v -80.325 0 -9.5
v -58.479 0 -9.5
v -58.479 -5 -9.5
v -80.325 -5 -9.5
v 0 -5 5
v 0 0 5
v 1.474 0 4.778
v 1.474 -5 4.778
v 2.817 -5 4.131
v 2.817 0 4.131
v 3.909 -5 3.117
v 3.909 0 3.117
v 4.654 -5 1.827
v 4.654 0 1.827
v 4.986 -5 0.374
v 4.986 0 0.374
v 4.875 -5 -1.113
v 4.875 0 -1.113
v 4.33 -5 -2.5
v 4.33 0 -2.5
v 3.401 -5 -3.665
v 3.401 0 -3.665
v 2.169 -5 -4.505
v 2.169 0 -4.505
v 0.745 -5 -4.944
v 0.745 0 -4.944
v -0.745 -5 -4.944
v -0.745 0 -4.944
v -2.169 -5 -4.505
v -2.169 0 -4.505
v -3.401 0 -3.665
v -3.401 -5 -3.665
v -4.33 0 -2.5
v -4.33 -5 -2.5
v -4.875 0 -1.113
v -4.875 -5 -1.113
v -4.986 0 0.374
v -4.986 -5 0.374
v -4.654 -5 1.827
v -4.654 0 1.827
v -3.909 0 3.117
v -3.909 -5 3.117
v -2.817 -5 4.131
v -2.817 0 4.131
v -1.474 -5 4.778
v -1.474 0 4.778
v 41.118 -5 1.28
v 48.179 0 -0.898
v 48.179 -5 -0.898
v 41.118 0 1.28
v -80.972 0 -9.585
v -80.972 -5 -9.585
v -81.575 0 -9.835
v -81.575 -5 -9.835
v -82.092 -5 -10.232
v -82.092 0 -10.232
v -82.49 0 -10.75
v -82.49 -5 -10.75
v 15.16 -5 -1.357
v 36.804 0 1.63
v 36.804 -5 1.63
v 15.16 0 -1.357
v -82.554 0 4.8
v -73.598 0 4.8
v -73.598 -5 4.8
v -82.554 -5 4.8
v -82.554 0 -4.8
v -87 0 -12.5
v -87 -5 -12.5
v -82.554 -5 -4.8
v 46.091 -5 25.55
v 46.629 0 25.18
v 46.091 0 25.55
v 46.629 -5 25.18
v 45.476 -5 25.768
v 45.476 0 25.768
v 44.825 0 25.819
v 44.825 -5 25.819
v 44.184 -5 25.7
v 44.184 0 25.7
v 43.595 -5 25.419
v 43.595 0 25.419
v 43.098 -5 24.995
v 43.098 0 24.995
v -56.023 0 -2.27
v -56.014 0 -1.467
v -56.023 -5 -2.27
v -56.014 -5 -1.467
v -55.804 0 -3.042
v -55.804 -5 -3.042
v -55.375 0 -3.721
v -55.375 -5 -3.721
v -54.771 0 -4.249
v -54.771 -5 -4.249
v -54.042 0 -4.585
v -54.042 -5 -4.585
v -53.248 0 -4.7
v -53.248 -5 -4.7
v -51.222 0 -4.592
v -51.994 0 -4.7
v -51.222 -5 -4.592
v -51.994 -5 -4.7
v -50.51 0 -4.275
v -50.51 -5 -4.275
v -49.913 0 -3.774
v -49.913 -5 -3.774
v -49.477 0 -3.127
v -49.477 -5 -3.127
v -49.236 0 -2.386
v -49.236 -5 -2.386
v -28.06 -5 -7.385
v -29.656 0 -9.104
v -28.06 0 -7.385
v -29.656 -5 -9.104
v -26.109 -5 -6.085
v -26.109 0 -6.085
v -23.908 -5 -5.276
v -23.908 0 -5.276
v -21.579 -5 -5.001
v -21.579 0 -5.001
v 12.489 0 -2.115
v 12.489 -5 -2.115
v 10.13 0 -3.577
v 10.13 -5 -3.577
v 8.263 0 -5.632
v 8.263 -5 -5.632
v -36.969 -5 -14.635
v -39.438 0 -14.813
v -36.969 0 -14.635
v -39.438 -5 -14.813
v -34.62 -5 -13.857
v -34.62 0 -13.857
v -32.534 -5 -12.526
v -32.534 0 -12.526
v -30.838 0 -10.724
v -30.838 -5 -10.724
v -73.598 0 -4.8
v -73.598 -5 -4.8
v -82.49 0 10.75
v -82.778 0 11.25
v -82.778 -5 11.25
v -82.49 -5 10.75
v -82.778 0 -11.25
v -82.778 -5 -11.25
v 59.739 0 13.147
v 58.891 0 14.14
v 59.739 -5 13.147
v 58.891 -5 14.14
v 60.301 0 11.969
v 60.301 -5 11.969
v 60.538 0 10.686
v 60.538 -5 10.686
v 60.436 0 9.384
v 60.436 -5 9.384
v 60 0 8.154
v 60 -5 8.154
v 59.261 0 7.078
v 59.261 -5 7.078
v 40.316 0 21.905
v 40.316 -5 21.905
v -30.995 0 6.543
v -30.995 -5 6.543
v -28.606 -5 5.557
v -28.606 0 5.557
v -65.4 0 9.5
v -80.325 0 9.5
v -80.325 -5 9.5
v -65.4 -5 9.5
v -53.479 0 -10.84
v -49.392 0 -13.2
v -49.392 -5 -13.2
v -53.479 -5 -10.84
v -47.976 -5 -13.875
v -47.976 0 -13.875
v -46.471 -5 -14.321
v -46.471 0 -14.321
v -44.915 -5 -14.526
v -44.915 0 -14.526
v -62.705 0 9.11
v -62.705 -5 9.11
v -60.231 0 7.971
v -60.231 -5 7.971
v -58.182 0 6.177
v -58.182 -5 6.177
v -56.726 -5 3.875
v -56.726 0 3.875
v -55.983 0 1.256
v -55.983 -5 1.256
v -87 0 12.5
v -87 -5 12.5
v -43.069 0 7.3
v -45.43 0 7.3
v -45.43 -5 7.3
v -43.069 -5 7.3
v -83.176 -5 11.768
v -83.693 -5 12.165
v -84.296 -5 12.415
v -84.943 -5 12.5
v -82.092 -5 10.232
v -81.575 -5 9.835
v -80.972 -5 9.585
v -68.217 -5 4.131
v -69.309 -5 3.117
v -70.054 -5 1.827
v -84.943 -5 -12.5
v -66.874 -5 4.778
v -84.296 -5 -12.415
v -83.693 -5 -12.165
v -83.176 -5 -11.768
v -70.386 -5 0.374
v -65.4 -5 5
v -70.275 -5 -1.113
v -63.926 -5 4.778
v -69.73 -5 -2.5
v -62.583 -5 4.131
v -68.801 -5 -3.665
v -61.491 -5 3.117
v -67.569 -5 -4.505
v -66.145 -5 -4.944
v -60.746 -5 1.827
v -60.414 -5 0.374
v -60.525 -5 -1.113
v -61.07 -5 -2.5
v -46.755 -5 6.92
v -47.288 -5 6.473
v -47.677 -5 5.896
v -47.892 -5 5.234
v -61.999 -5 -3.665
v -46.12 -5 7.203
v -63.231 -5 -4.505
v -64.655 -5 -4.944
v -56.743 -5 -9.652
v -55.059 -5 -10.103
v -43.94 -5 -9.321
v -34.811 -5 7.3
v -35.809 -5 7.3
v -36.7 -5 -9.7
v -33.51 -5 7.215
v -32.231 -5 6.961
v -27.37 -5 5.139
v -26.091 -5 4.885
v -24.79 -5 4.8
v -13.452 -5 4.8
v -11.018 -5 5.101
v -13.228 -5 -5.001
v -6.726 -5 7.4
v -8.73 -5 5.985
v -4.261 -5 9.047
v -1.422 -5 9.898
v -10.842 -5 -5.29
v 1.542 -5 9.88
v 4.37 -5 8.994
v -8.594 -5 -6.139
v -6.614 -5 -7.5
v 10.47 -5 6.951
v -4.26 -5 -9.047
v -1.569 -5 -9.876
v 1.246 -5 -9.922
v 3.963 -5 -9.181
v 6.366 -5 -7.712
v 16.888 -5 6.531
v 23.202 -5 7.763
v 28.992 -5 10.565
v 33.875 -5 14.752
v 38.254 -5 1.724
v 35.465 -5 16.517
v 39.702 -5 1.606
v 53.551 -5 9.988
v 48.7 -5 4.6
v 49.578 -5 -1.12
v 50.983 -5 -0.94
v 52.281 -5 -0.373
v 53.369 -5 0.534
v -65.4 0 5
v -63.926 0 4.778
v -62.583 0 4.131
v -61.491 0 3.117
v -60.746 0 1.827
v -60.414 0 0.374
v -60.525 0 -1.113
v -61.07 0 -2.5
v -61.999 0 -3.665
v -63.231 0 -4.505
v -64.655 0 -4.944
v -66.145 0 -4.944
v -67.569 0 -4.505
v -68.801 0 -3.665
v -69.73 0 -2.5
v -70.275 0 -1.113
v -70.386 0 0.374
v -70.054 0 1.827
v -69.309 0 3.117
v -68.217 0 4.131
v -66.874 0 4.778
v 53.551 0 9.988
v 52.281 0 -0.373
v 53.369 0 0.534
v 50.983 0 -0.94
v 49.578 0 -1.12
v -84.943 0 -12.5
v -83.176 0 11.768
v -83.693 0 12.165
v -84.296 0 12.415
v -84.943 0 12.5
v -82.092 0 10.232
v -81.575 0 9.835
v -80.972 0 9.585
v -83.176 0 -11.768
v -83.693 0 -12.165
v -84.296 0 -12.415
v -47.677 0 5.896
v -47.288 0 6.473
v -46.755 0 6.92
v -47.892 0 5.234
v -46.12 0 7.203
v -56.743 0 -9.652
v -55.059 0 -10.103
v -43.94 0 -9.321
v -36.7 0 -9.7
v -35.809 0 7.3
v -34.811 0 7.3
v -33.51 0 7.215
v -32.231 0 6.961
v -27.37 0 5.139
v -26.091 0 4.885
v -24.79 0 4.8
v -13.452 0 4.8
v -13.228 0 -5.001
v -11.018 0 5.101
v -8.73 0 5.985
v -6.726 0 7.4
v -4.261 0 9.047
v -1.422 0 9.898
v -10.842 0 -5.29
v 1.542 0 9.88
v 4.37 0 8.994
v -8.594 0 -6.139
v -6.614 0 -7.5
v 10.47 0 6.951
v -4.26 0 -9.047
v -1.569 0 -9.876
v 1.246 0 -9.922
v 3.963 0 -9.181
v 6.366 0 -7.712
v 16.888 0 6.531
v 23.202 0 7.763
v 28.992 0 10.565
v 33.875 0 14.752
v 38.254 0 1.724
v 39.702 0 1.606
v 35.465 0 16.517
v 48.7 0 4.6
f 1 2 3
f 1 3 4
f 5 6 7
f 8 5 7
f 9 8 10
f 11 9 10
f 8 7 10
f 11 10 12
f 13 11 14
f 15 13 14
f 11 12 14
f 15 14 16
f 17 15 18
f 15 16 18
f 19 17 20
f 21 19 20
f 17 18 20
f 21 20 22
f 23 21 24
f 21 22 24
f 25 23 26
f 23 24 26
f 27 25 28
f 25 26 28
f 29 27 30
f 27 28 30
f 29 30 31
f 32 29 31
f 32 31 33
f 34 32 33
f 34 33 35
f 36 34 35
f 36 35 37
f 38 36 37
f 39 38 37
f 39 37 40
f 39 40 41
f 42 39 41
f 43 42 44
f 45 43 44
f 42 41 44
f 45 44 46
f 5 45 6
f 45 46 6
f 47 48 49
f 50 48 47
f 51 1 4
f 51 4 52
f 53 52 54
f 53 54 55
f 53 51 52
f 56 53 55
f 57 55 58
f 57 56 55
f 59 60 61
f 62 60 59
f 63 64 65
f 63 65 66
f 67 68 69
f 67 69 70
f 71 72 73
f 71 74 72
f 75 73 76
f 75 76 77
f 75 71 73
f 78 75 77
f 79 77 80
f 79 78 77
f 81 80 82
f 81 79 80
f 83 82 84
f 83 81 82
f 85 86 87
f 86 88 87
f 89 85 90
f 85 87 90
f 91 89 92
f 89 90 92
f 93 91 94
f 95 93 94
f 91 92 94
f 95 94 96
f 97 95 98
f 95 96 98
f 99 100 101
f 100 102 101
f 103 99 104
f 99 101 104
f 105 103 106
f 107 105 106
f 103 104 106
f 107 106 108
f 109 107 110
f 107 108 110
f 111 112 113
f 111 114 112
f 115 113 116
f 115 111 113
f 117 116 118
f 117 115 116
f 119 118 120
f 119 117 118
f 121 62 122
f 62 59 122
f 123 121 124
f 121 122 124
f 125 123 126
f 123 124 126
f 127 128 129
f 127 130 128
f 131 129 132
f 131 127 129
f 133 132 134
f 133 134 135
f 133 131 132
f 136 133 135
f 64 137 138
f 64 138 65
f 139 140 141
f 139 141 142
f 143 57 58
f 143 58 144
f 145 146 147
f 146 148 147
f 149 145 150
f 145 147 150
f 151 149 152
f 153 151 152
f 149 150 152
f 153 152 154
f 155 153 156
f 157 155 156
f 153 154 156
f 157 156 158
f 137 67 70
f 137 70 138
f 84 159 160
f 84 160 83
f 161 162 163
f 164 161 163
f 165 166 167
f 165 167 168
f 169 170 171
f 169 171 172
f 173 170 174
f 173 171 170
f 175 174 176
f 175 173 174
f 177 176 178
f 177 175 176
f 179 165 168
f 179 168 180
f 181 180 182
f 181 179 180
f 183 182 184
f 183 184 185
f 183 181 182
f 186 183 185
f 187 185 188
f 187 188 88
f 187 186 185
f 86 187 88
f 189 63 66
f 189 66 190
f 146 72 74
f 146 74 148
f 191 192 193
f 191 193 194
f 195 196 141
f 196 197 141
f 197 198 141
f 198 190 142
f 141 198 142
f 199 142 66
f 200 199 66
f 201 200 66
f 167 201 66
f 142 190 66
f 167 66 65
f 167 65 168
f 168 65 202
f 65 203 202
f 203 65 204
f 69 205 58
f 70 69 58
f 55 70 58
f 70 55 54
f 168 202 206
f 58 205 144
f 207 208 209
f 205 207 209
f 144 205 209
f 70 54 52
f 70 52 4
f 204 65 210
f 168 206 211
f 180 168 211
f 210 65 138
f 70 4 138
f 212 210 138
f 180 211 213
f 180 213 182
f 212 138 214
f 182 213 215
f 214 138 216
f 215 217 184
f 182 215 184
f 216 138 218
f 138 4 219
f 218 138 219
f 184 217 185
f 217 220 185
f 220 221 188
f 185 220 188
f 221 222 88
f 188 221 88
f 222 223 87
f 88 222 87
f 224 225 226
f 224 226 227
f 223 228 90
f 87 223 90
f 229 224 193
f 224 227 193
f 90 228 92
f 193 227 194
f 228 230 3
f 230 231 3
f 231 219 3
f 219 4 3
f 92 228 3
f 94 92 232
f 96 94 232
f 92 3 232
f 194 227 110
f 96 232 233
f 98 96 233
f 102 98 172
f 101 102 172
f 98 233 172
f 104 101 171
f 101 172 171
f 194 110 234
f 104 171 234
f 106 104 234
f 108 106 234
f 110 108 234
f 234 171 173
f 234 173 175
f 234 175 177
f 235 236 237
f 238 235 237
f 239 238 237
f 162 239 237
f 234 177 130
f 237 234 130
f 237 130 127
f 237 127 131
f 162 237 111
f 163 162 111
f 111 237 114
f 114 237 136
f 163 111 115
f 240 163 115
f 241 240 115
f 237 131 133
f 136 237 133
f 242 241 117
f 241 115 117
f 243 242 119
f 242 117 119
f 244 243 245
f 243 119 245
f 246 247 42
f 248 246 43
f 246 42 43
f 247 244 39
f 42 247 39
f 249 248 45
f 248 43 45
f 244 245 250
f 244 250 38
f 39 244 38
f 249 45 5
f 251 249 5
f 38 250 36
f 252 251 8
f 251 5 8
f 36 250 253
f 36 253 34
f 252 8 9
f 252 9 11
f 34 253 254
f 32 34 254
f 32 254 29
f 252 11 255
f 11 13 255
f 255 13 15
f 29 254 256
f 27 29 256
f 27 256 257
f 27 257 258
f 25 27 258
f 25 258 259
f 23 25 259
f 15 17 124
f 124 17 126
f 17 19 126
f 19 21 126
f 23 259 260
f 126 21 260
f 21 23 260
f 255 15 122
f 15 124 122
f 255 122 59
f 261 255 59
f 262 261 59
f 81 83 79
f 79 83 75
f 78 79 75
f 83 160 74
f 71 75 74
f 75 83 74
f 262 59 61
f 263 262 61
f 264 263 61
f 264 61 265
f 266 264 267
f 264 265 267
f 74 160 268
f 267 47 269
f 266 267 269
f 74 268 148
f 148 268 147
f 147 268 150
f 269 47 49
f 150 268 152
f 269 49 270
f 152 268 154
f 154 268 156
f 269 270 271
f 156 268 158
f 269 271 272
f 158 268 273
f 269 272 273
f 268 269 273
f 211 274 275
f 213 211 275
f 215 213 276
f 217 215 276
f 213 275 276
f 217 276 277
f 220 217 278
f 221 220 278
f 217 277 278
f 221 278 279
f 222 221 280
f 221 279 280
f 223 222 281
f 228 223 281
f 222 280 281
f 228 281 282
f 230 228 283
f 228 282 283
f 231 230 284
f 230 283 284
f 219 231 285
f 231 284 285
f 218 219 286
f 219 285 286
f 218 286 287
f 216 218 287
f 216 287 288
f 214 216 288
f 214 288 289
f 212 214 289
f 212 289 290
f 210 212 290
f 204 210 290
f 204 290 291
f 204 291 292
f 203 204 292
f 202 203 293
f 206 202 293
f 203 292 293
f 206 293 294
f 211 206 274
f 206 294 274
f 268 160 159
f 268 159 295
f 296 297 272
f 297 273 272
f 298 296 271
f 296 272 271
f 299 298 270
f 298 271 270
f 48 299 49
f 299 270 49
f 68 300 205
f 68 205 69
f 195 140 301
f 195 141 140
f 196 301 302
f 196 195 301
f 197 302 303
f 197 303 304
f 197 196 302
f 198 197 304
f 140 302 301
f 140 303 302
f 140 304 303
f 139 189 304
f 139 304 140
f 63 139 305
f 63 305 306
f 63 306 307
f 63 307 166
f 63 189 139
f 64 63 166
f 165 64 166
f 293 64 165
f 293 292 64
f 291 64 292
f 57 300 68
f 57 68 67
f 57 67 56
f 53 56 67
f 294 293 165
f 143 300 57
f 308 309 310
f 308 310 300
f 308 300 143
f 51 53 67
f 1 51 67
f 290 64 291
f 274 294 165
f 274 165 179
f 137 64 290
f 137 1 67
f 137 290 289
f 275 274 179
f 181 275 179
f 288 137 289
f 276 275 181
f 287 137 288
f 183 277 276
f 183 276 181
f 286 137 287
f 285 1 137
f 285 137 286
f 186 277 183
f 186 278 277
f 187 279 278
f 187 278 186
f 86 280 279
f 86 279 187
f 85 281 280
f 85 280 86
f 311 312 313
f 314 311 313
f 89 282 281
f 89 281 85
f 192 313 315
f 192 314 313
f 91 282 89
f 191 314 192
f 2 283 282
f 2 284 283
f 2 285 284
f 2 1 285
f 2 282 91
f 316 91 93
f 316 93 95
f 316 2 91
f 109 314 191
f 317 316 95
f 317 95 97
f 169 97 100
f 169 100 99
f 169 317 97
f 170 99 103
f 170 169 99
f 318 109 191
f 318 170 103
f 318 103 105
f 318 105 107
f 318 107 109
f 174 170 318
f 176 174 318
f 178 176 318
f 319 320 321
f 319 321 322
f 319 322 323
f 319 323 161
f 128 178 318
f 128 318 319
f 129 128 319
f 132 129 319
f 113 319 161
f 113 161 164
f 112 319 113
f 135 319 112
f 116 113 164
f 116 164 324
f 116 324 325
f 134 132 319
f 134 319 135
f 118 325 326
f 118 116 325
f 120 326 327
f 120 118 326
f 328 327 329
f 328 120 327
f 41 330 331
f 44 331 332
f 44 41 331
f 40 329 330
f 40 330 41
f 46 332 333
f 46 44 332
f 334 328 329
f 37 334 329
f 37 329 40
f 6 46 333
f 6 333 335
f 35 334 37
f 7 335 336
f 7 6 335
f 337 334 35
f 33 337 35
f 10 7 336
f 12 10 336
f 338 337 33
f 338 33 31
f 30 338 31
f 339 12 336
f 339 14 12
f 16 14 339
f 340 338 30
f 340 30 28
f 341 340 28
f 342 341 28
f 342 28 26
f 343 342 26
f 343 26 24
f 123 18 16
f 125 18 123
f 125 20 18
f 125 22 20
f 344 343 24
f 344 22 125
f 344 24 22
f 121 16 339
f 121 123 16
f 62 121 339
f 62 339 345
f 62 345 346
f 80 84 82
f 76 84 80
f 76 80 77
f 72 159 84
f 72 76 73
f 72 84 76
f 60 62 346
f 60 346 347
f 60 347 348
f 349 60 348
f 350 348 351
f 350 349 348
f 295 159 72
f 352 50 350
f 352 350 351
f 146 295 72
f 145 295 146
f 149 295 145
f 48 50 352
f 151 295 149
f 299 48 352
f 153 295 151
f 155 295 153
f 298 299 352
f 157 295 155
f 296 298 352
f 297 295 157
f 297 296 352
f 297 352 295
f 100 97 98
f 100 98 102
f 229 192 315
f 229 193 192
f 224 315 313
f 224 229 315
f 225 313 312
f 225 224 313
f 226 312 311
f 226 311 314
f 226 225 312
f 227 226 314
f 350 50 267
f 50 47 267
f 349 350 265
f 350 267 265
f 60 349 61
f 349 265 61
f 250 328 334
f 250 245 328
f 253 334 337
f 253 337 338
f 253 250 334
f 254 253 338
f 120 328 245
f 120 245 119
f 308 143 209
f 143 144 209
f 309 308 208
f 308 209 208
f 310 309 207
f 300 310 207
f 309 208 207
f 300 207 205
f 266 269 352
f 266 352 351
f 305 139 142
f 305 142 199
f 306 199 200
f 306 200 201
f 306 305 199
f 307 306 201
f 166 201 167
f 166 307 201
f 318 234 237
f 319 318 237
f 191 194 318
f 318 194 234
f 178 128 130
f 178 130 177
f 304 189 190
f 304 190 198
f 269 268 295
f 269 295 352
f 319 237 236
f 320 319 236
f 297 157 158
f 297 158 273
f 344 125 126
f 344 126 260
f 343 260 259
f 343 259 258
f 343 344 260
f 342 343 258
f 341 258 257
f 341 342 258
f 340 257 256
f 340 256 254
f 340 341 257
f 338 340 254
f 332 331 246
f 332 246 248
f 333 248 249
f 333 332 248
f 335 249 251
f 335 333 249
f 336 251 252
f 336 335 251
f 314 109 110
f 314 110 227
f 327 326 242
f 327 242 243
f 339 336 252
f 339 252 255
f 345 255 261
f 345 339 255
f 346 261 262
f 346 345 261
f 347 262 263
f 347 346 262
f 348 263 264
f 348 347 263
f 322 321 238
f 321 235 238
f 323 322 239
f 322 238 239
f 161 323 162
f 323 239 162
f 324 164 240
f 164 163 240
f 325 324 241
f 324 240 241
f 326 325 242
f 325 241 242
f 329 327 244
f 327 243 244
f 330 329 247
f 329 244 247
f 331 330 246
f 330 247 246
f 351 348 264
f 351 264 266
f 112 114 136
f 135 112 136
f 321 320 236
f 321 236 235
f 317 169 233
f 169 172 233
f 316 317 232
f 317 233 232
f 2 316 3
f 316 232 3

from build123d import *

# Parameters (mm, degrees)
SKETCH_2_R          = 5
EXTRUDE_1_DEPTH     = 5
CUT_EXTRUDE_1_DEPTH = 92.187134051
FILLET_1_R          = 2.8
FILLET_2_R          = 2.8
FILLET_3_R          = 10
FILLET_4_R          = 5
FILLET_5_R          = 2.5
FILLET_6_R          = 10


with BuildPart() as part:
    # 草图2 → 凸台-拉伸1 (new body)
    # profile 1 of 2: a face of its own
    with BuildSketch(Plane(origin=(0, 0, 0), x_dir=(1, 0, 0), z_dir=(0, 1, 0))):
        with BuildLine():
            Line((-55.8, 9.5), (-65.4, 9.5))
            ThreePointArc((-65.4, 9.5), (-60.625065445, 8.212794896), (-57.144093024, 4.7))
            Line((-57.144093024, 4.7), (-49.644093024, 4.7))
            Line((-49.644093024, 4.7), (-47.528169255, -7.3))
            Line((-47.528169255, -7.3), (-32.828169255, -7.3))
            Line((-32.828169255, -7.3), (-26.77268488, -4.8))
            Line((-26.77268488, -4.8), (-8.77268488, -4.8))
            ThreePointArc((-8.77268488, -4.8), (-3.040245716, -9.526641905), (4.370469962, -8.994386711))
            ThreePointArc((4.370469962, -8.994386711), (20.084939282, -6.943193169), (33.875265504, -14.75208833))
            Line((33.875265504, -14.75208833), (44.771139737, -26.853182613))
            Line((44.771139737, -26.853182613), (62.606615548, -10.794048061))
            Line((62.606615548, -10.794048061), (51.23139524, 1.839413972))
            Line((51.23139524, 1.839413972), (39, -1.933246956))
            Line((39, -1.933246956), (9.777013859, 2.1))
            ThreePointArc((9.777013859, 2.1), (1.554340892, 9.878462653), (-8.659704384, 5.000951907))
            Line((-8.659704384, 5.000951907), (-26.659704384, 5.000951907))
            Line((-26.659704384, 5.000951907), (-34.031178231, 15.096068218))
            Line((-34.031178231, 15.096068218), (-47.312951043, 14.4))
            Line((-47.312951043, 14.4), (-55.8, 9.5))
        make_face()
        with Locations(Location((0, 0, 0), (0, 0, 270))):
            Circle(SKETCH_2_R, mode=Mode.SUBTRACT)
    # profile 2 of 2: a face of its own
    with BuildSketch(Plane(origin=(0, 0, 0), x_dir=(1, 0, 0), z_dir=(0, 1, 0))):
        with BuildLine():
            Line((-80.324573519, -9.5), (-65.4, -9.5))
            ThreePointArc((-65.4, -9.5), (-55.9, 0), (-65.4, 9.5))
            Line((-65.4, 9.5), (-80.324573519, 9.5))
            ThreePointArc((-80.324573519, 9.5), (-81.574573519, 9.834936491), (-82.489637029, 10.75))
            Line((-82.489637029, 10.75), (-83.5, 12.5))
            Line((-83.5, 12.5), (-87, 12.5))
            Line((-87, 12.5), (-82.554402927, 4.8))
            Line((-82.554402927, 4.8), (-73.598170528, 4.8))
            Line((-73.598170528, 4.8), (-73.598170528, -4.8))
            Line((-73.598170528, -4.8), (-82.554402927, -4.8))
            Line((-82.554402927, -4.8), (-87, -12.5))
            Line((-87, -12.5), (-83.5, -12.5))
            Line((-83.5, -12.5), (-82.489637029, -10.75))
            ThreePointArc((-82.489637029, -10.75), (-81.574573519, -9.834936491), (-80.324573519, -9.5))
        make_face()
        with Locations(Location((-65.4, 0, 0), (0, 0, 270))):
            Circle(SKETCH_2_R, mode=Mode.SUBTRACT)
    extrude(amount=-EXTRUDE_1_DEPTH)

    # 草图4 → 切除-拉伸1 (cut, through all)
    with BuildSketch(Plane(origin=(0, -5, 0), x_dir=(-1, 0, 0), z_dir=(0, -1, 0))):
        Polygon((42.343817462, -21.137636493), (43.940064127, 9.320564317), (36.7, 9.7), (35.103753335, -20.75820081), align=None)
        Polygon((-48.7, -4.6), (-26.034082823, -25.008483494), (-30.885279719, -30.396283479), (-53.551196896, -9.987799985), align=None)
    extrude(amount=-CUT_EXTRUDE_1_DEPTH, mode=Mode.SUBTRACT)

    # 圆角1
    fillet_1_edges = [part.edges().sort_by_distance(p)[0] for p in [
        (-57.144093024, -2.5, -4.7),
    ]]
    fillet(fillet_1_edges, radius=FILLET_1_R)

    # 圆角2
    fillet_2_edges = [part.edges().sort_by_distance(p)[0] for p in [
        (-49.644093024, -2.5, -4.7),
    ]]
    fillet(fillet_2_edges, radius=FILLET_2_R)

    # 圆角3
    fillet_3_edges = [part.edges().sort_by_distance(p)[0] for p in [
        (-47.312951043, -2.5, -14.4),
        (-34.031178231, -2.5, -15.096068218),
        (-26.659704384, -2.5, -5.000951907),
        (-8.659704384, -2.5, -5.000951907),
        (9.777013859, -2.5, -2.1),
        (39, -2.5, 1.933246956),
        (-8.77268488, -2.5, 4.8),
        (-26.77268488, -2.5, 4.8),
        (-32.828169255, -2.5, 7.3),
    ]]
    fillet(fillet_3_edges, radius=FILLET_3_R)

    # 圆角4
    fillet_4_edges = [part.edges().sort_by_distance(p)[0] for p in [
        (51.23139524, -2.5, -1.839413972),
        (62.606615548, -2.5, 10.794048061),
    ]]
    fillet(fillet_4_edges, radius=FILLET_4_R)

    # 圆角5
    fillet_5_edges = [part.edges().sort_by_distance(p)[0] for p in [
        (44.771139737, -2.5, 26.853182613),
        (-47.528169255, -2.5, 7.3),
        (-83.5, -2.5, 12.5),
        (-83.5, -2.5, -12.5),
    ]]
    fillet(fillet_5_edges, radius=FILLET_5_R)

    # 圆角6
    fillet_6_edges = [part.edges().sort_by_distance(p)[0] for p in [
        (-55.8, -2.5, -9.5),
    ]]
    fillet(fillet_6_edges, radius=FILLET_6_R)


solid = part.part
